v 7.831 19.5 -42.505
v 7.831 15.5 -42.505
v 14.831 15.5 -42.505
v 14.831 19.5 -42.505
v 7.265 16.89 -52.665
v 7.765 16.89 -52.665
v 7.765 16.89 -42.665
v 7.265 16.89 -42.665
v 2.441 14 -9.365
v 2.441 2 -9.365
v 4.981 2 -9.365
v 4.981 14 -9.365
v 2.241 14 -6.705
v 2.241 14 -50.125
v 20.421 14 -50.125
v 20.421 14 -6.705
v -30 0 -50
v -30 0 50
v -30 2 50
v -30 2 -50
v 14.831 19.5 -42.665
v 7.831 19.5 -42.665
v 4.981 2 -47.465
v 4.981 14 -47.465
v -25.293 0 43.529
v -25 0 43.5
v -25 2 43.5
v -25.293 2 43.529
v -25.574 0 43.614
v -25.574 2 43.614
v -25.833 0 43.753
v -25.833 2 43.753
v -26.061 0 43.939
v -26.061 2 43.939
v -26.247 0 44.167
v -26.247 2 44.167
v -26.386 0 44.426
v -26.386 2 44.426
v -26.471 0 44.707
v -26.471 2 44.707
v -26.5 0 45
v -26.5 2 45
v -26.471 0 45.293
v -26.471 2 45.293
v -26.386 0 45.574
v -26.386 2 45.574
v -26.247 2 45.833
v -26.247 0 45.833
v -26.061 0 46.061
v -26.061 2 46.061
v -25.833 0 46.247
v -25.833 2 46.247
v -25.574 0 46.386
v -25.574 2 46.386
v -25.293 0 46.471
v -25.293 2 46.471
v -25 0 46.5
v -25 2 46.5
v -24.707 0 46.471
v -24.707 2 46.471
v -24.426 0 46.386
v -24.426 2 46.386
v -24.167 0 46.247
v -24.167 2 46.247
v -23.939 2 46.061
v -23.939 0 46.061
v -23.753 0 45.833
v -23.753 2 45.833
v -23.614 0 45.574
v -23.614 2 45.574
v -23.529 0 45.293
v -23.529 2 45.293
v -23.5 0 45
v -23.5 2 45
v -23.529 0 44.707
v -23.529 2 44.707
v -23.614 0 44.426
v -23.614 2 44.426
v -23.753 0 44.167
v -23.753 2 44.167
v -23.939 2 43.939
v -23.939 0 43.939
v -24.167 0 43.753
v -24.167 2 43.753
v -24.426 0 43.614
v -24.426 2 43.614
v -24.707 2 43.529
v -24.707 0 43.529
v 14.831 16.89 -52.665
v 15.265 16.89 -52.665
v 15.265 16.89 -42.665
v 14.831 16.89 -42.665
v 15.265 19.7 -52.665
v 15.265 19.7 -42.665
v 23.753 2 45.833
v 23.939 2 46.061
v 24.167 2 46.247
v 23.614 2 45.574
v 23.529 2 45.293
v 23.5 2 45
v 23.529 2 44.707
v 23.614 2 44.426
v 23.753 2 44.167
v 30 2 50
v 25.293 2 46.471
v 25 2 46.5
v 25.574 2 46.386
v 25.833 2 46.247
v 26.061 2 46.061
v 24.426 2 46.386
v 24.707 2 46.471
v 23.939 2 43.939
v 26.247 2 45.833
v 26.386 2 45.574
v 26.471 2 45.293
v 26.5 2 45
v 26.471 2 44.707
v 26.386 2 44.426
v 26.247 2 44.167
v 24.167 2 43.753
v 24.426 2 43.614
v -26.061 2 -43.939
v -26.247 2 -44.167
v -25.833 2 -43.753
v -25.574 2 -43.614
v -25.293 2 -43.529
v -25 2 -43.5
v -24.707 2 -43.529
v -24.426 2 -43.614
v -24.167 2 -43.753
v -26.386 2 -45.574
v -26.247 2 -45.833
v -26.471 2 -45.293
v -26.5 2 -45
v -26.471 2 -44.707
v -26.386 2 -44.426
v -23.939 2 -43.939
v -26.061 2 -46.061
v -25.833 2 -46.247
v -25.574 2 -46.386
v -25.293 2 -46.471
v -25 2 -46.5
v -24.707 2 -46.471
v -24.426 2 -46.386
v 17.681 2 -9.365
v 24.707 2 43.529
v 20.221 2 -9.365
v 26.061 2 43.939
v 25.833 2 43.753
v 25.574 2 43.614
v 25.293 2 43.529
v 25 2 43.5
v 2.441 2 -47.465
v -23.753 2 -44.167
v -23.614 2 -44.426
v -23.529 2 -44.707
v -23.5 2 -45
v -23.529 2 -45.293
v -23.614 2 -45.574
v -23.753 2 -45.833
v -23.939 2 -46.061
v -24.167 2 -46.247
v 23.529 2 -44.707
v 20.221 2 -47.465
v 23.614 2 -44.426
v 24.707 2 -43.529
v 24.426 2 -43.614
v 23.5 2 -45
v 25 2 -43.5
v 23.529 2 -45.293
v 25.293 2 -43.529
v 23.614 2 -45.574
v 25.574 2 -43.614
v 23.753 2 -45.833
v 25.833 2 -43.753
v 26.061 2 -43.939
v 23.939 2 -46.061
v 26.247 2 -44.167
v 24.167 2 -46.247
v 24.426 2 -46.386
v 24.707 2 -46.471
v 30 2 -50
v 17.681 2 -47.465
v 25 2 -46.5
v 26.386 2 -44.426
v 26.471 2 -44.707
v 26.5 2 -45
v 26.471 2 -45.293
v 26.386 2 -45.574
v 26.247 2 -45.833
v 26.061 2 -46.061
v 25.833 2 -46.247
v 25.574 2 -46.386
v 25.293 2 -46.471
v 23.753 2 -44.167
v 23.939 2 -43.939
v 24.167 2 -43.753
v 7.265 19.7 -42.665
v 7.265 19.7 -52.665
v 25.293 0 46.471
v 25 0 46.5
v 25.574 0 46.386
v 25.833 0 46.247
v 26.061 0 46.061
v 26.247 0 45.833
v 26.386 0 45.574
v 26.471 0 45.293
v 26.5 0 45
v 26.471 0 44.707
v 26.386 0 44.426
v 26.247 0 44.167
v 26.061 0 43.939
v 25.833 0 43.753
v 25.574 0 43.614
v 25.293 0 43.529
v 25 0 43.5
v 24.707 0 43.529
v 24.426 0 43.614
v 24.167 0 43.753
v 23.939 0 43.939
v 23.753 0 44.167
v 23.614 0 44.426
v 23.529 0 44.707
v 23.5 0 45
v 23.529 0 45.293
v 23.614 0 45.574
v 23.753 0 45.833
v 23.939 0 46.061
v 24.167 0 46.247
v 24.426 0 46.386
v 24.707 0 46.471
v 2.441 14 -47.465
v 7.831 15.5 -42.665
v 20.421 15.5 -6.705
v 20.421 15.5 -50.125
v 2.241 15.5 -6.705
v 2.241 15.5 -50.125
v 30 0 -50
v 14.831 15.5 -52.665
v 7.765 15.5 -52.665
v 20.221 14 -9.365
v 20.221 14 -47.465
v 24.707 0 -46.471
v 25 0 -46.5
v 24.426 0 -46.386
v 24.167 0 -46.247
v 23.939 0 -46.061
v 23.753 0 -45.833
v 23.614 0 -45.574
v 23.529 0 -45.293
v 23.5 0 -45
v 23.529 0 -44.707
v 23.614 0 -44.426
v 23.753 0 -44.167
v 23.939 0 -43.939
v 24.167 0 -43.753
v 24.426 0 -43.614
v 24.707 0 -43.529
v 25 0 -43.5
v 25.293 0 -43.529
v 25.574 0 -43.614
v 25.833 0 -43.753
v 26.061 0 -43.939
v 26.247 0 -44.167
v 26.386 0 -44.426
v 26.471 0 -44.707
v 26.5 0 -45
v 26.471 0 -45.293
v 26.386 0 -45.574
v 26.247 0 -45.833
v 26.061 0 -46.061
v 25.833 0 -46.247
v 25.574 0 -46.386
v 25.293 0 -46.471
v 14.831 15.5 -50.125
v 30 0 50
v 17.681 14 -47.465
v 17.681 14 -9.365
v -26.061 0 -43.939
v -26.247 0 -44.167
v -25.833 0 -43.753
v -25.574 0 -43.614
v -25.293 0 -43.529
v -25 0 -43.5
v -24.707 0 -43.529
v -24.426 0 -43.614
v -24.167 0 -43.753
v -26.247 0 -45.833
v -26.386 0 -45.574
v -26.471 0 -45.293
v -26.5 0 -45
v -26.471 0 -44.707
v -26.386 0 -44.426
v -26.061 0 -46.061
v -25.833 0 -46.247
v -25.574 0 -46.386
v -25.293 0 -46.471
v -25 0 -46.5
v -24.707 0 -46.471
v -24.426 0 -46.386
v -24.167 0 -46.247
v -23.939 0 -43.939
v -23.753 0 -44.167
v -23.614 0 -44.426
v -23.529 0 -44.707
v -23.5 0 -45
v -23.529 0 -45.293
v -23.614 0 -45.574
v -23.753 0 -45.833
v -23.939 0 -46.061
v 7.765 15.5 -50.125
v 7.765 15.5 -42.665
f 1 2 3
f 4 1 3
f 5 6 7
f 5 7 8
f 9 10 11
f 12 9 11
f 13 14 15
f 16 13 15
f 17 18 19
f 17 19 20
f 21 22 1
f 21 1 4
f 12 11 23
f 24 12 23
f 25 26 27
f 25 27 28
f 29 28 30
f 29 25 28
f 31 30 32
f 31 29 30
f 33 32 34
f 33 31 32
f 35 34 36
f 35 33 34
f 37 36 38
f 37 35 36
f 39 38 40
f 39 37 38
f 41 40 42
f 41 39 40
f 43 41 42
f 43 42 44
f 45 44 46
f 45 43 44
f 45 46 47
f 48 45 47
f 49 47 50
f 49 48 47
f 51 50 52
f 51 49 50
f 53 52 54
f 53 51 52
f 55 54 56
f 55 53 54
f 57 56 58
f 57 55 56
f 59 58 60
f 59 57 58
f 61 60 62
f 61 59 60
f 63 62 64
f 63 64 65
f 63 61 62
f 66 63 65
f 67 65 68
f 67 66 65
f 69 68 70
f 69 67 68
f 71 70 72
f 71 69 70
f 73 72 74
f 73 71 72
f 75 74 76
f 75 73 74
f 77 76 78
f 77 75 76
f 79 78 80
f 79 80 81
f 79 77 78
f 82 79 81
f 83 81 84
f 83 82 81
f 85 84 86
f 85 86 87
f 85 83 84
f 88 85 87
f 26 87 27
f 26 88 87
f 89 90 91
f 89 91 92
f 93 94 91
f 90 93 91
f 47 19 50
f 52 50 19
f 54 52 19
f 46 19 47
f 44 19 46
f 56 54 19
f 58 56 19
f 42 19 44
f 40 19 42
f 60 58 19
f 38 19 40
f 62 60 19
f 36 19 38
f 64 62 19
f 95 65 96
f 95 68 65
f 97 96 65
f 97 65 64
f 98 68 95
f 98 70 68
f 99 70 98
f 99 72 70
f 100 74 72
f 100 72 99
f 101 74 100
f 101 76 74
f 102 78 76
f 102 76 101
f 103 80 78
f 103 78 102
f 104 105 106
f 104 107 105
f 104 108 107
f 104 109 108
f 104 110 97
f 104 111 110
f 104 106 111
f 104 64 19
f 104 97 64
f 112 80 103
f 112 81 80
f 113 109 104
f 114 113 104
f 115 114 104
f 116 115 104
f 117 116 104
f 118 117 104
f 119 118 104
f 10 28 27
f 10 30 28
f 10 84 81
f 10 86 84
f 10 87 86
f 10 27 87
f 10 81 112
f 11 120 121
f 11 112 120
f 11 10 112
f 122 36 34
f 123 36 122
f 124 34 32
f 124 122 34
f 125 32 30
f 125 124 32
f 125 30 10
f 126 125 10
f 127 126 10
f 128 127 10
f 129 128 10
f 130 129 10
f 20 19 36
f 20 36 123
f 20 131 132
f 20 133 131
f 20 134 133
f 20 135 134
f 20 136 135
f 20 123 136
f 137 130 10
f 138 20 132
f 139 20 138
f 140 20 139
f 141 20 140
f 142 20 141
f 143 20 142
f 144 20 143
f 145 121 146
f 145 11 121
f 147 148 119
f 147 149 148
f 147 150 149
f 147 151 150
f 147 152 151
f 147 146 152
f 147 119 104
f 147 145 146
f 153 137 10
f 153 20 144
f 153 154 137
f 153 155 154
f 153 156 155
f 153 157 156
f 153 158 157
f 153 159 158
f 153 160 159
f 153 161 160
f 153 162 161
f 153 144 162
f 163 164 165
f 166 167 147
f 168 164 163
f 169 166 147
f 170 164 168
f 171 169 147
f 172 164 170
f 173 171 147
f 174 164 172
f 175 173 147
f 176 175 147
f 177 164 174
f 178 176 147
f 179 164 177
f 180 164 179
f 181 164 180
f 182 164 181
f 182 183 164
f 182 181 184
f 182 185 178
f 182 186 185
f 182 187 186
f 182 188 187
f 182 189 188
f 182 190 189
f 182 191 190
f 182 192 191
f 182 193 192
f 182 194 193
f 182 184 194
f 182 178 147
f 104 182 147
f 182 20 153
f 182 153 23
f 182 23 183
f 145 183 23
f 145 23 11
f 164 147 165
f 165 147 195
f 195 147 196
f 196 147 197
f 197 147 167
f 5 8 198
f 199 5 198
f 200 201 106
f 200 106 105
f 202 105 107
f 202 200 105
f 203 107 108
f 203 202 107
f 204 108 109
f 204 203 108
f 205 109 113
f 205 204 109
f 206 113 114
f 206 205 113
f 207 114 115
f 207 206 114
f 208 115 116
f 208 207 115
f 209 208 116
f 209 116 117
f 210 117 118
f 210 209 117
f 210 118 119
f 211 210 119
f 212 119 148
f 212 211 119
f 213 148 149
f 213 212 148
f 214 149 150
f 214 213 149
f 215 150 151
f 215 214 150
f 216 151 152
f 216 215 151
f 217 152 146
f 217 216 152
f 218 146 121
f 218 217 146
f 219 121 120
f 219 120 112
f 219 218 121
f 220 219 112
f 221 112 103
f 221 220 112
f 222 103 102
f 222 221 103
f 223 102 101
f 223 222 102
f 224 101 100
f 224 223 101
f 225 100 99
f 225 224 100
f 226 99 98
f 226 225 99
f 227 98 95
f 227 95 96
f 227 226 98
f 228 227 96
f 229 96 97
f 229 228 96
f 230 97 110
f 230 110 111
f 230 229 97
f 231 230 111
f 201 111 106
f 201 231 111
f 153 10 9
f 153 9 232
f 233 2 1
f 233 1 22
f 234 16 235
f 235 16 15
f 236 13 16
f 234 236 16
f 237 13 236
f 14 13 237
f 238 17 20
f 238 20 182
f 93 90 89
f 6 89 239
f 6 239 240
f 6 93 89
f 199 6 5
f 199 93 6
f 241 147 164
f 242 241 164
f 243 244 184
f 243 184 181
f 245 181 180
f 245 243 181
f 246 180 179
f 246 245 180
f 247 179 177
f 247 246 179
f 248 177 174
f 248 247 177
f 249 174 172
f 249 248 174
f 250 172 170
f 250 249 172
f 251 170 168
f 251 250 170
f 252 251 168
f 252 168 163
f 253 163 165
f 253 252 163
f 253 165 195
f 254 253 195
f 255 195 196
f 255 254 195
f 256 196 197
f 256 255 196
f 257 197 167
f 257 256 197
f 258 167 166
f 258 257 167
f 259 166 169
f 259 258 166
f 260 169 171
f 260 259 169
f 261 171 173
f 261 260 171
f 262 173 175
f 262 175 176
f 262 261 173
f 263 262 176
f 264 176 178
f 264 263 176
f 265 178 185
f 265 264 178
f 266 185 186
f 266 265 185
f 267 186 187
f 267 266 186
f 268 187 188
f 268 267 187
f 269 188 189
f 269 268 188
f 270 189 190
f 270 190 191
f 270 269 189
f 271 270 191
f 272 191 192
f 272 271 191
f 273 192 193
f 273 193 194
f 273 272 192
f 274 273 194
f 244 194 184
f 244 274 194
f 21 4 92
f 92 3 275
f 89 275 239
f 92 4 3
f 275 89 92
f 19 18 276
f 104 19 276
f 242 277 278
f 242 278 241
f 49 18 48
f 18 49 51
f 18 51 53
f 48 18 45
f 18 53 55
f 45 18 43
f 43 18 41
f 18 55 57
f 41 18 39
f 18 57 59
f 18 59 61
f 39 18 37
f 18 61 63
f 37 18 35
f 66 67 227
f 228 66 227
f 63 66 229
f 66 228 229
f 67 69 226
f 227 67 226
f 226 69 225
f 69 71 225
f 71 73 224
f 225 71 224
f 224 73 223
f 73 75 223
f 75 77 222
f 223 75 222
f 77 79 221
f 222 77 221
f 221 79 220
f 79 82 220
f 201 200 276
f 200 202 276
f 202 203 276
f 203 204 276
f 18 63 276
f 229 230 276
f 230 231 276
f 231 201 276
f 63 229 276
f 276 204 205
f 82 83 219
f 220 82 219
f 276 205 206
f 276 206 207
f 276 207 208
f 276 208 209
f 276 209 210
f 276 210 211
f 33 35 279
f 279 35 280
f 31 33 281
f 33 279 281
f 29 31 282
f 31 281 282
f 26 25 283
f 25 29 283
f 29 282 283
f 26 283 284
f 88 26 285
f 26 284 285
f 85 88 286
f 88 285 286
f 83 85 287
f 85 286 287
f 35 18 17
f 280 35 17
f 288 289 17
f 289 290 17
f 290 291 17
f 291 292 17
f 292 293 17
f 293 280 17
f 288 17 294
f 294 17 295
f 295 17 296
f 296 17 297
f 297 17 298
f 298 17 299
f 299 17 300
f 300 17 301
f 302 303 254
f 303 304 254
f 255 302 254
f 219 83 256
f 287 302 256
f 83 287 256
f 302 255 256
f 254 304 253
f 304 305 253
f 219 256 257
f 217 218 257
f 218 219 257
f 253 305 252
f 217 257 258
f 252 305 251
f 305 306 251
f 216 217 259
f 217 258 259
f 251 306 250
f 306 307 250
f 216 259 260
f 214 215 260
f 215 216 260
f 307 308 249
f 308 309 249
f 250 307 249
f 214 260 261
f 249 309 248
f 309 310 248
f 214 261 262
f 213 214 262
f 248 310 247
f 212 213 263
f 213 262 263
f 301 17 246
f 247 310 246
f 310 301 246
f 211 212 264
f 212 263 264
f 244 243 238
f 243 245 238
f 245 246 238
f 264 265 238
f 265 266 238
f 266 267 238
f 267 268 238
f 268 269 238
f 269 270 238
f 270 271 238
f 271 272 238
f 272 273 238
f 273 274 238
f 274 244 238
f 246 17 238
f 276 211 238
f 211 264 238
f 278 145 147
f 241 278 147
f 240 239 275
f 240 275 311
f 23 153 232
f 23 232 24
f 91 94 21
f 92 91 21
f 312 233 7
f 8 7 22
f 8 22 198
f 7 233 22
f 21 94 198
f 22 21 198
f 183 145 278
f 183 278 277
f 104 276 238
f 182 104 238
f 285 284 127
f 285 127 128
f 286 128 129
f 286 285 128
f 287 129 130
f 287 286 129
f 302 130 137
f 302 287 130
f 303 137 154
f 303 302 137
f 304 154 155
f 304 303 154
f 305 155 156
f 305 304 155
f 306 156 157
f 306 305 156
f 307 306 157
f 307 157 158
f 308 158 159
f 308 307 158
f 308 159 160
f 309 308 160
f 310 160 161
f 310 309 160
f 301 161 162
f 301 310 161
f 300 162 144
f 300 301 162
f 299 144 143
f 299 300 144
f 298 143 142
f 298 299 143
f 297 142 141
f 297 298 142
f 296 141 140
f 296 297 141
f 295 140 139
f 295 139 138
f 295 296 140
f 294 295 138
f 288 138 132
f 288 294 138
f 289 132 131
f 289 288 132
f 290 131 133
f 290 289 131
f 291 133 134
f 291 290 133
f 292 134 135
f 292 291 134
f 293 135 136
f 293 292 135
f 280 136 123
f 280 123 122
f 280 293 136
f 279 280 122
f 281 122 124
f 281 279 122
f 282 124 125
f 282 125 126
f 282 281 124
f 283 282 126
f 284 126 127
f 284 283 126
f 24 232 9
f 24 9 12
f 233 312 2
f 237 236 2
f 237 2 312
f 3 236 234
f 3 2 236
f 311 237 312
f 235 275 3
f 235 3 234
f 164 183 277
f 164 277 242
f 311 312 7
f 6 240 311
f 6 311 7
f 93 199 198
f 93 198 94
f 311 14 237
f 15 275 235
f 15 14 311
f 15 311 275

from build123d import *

# Parameters (mm, degrees)
CROQUIS1_W              = 60
CROQUIS1_H              = 100
CROQUIS1_R              = 1.5
SALIENTE_EXTRUIR1_DEPTH = 2
CROQUIS2_W              = 2.54
CROQUIS2_H              = 38.1
SALIENTE_EXTRUIR2_DEPTH = 12
CROQUIS3_W              = 18.18
CROQUIS3_H              = 43.42
SALIENTE_EXTRUIR3_DEPTH = 1.5
CROQUIS4_W              = 7
CROQUIS4_H              = 10.16
SALIENTE_EXTRUIR4_DEPTH = 4
SALIENTE_EXTRUIR5_DEPTH = 10


with BuildPart() as part:
    # Croquis1 → Saliente-Extruir1 (new body)
    with BuildSketch(Plane(origin=(0, 0, 0), x_dir=(1, 0, 0), z_dir=(0, 1, 0))):
        Rectangle(CROQUIS1_W, CROQUIS1_H)
        with Locations(Location((-25, 45, 0), (0, 0, 270))):
            Circle(CROQUIS1_R, mode=Mode.SUBTRACT)
        with Locations(Location((25, 45, 0), (0, 0, 90))):
            Circle(CROQUIS1_R, mode=Mode.SUBTRACT)
        with Locations(Location((25, -45, 0), (0, 0, 270))):
            Circle(CROQUIS1_R, mode=Mode.SUBTRACT)
        with Locations(Location((-25, -45, 0), (0, 0, 90))):
            Circle(CROQUIS1_R, mode=Mode.SUBTRACT)
    extrude(amount=SALIENTE_EXTRUIR1_DEPTH)

    # Croquis2 → Saliente-Extruir2 (add)
    with BuildSketch(Plane(origin=(0, 2, 0), x_dir=(1, 0, 0), z_dir=(0, 1, 0))):
        with Locations((3.711, 28.415)):
            Rectangle(CROQUIS2_W, CROQUIS2_H)
        with Locations((18.951, 28.415)):
            Rectangle(CROQUIS2_W, CROQUIS2_H)
    extrude(amount=SALIENTE_EXTRUIR2_DEPTH)


with BuildPart() as body_2:
    # Croquis3 → Saliente-Extruir3 (new body)
    with BuildSketch(Plane(origin=(0, 14, 0), x_dir=(1, 0, 0), z_dir=(0, 1, 0))):
        with Locations((11.331, 28.415)):
            Rectangle(CROQUIS3_W, CROQUIS3_H)
    extrude(amount=SALIENTE_EXTRUIR3_DEPTH)

    # Croquis4 → Saliente-Extruir4 (add)
    with BuildSketch(Plane(origin=(0, 15.5, 0), x_dir=(1, 0, 0), z_dir=(0, 1, 0))):
        with Locations((11.331, 47.585)):
            Rectangle(CROQUIS4_W, CROQUIS4_H)
    extrude(amount=SALIENTE_EXTRUIR4_DEPTH)

    # Croquis5 → Saliente-Extruir5 (add)
    with BuildSketch(Plane(origin=(0, 0, -52.665), x_dir=(-1, 0, 0), z_dir=(0, 0, -1))):
        Polygon((-15.26489693, 16.89), (-14.76489693, 16.89), (-14.76489693, 15.5), (-7.76489693, 15.5), (-7.76489693, 16.89), (-7.26489693, 16.89), (-7.26489693, 19.7), (-15.26489693, 19.7), align=None)
    extrude(amount=-SALIENTE_EXTRUIR5_DEPTH)


solid = Compound([part.part, body_2.part])
